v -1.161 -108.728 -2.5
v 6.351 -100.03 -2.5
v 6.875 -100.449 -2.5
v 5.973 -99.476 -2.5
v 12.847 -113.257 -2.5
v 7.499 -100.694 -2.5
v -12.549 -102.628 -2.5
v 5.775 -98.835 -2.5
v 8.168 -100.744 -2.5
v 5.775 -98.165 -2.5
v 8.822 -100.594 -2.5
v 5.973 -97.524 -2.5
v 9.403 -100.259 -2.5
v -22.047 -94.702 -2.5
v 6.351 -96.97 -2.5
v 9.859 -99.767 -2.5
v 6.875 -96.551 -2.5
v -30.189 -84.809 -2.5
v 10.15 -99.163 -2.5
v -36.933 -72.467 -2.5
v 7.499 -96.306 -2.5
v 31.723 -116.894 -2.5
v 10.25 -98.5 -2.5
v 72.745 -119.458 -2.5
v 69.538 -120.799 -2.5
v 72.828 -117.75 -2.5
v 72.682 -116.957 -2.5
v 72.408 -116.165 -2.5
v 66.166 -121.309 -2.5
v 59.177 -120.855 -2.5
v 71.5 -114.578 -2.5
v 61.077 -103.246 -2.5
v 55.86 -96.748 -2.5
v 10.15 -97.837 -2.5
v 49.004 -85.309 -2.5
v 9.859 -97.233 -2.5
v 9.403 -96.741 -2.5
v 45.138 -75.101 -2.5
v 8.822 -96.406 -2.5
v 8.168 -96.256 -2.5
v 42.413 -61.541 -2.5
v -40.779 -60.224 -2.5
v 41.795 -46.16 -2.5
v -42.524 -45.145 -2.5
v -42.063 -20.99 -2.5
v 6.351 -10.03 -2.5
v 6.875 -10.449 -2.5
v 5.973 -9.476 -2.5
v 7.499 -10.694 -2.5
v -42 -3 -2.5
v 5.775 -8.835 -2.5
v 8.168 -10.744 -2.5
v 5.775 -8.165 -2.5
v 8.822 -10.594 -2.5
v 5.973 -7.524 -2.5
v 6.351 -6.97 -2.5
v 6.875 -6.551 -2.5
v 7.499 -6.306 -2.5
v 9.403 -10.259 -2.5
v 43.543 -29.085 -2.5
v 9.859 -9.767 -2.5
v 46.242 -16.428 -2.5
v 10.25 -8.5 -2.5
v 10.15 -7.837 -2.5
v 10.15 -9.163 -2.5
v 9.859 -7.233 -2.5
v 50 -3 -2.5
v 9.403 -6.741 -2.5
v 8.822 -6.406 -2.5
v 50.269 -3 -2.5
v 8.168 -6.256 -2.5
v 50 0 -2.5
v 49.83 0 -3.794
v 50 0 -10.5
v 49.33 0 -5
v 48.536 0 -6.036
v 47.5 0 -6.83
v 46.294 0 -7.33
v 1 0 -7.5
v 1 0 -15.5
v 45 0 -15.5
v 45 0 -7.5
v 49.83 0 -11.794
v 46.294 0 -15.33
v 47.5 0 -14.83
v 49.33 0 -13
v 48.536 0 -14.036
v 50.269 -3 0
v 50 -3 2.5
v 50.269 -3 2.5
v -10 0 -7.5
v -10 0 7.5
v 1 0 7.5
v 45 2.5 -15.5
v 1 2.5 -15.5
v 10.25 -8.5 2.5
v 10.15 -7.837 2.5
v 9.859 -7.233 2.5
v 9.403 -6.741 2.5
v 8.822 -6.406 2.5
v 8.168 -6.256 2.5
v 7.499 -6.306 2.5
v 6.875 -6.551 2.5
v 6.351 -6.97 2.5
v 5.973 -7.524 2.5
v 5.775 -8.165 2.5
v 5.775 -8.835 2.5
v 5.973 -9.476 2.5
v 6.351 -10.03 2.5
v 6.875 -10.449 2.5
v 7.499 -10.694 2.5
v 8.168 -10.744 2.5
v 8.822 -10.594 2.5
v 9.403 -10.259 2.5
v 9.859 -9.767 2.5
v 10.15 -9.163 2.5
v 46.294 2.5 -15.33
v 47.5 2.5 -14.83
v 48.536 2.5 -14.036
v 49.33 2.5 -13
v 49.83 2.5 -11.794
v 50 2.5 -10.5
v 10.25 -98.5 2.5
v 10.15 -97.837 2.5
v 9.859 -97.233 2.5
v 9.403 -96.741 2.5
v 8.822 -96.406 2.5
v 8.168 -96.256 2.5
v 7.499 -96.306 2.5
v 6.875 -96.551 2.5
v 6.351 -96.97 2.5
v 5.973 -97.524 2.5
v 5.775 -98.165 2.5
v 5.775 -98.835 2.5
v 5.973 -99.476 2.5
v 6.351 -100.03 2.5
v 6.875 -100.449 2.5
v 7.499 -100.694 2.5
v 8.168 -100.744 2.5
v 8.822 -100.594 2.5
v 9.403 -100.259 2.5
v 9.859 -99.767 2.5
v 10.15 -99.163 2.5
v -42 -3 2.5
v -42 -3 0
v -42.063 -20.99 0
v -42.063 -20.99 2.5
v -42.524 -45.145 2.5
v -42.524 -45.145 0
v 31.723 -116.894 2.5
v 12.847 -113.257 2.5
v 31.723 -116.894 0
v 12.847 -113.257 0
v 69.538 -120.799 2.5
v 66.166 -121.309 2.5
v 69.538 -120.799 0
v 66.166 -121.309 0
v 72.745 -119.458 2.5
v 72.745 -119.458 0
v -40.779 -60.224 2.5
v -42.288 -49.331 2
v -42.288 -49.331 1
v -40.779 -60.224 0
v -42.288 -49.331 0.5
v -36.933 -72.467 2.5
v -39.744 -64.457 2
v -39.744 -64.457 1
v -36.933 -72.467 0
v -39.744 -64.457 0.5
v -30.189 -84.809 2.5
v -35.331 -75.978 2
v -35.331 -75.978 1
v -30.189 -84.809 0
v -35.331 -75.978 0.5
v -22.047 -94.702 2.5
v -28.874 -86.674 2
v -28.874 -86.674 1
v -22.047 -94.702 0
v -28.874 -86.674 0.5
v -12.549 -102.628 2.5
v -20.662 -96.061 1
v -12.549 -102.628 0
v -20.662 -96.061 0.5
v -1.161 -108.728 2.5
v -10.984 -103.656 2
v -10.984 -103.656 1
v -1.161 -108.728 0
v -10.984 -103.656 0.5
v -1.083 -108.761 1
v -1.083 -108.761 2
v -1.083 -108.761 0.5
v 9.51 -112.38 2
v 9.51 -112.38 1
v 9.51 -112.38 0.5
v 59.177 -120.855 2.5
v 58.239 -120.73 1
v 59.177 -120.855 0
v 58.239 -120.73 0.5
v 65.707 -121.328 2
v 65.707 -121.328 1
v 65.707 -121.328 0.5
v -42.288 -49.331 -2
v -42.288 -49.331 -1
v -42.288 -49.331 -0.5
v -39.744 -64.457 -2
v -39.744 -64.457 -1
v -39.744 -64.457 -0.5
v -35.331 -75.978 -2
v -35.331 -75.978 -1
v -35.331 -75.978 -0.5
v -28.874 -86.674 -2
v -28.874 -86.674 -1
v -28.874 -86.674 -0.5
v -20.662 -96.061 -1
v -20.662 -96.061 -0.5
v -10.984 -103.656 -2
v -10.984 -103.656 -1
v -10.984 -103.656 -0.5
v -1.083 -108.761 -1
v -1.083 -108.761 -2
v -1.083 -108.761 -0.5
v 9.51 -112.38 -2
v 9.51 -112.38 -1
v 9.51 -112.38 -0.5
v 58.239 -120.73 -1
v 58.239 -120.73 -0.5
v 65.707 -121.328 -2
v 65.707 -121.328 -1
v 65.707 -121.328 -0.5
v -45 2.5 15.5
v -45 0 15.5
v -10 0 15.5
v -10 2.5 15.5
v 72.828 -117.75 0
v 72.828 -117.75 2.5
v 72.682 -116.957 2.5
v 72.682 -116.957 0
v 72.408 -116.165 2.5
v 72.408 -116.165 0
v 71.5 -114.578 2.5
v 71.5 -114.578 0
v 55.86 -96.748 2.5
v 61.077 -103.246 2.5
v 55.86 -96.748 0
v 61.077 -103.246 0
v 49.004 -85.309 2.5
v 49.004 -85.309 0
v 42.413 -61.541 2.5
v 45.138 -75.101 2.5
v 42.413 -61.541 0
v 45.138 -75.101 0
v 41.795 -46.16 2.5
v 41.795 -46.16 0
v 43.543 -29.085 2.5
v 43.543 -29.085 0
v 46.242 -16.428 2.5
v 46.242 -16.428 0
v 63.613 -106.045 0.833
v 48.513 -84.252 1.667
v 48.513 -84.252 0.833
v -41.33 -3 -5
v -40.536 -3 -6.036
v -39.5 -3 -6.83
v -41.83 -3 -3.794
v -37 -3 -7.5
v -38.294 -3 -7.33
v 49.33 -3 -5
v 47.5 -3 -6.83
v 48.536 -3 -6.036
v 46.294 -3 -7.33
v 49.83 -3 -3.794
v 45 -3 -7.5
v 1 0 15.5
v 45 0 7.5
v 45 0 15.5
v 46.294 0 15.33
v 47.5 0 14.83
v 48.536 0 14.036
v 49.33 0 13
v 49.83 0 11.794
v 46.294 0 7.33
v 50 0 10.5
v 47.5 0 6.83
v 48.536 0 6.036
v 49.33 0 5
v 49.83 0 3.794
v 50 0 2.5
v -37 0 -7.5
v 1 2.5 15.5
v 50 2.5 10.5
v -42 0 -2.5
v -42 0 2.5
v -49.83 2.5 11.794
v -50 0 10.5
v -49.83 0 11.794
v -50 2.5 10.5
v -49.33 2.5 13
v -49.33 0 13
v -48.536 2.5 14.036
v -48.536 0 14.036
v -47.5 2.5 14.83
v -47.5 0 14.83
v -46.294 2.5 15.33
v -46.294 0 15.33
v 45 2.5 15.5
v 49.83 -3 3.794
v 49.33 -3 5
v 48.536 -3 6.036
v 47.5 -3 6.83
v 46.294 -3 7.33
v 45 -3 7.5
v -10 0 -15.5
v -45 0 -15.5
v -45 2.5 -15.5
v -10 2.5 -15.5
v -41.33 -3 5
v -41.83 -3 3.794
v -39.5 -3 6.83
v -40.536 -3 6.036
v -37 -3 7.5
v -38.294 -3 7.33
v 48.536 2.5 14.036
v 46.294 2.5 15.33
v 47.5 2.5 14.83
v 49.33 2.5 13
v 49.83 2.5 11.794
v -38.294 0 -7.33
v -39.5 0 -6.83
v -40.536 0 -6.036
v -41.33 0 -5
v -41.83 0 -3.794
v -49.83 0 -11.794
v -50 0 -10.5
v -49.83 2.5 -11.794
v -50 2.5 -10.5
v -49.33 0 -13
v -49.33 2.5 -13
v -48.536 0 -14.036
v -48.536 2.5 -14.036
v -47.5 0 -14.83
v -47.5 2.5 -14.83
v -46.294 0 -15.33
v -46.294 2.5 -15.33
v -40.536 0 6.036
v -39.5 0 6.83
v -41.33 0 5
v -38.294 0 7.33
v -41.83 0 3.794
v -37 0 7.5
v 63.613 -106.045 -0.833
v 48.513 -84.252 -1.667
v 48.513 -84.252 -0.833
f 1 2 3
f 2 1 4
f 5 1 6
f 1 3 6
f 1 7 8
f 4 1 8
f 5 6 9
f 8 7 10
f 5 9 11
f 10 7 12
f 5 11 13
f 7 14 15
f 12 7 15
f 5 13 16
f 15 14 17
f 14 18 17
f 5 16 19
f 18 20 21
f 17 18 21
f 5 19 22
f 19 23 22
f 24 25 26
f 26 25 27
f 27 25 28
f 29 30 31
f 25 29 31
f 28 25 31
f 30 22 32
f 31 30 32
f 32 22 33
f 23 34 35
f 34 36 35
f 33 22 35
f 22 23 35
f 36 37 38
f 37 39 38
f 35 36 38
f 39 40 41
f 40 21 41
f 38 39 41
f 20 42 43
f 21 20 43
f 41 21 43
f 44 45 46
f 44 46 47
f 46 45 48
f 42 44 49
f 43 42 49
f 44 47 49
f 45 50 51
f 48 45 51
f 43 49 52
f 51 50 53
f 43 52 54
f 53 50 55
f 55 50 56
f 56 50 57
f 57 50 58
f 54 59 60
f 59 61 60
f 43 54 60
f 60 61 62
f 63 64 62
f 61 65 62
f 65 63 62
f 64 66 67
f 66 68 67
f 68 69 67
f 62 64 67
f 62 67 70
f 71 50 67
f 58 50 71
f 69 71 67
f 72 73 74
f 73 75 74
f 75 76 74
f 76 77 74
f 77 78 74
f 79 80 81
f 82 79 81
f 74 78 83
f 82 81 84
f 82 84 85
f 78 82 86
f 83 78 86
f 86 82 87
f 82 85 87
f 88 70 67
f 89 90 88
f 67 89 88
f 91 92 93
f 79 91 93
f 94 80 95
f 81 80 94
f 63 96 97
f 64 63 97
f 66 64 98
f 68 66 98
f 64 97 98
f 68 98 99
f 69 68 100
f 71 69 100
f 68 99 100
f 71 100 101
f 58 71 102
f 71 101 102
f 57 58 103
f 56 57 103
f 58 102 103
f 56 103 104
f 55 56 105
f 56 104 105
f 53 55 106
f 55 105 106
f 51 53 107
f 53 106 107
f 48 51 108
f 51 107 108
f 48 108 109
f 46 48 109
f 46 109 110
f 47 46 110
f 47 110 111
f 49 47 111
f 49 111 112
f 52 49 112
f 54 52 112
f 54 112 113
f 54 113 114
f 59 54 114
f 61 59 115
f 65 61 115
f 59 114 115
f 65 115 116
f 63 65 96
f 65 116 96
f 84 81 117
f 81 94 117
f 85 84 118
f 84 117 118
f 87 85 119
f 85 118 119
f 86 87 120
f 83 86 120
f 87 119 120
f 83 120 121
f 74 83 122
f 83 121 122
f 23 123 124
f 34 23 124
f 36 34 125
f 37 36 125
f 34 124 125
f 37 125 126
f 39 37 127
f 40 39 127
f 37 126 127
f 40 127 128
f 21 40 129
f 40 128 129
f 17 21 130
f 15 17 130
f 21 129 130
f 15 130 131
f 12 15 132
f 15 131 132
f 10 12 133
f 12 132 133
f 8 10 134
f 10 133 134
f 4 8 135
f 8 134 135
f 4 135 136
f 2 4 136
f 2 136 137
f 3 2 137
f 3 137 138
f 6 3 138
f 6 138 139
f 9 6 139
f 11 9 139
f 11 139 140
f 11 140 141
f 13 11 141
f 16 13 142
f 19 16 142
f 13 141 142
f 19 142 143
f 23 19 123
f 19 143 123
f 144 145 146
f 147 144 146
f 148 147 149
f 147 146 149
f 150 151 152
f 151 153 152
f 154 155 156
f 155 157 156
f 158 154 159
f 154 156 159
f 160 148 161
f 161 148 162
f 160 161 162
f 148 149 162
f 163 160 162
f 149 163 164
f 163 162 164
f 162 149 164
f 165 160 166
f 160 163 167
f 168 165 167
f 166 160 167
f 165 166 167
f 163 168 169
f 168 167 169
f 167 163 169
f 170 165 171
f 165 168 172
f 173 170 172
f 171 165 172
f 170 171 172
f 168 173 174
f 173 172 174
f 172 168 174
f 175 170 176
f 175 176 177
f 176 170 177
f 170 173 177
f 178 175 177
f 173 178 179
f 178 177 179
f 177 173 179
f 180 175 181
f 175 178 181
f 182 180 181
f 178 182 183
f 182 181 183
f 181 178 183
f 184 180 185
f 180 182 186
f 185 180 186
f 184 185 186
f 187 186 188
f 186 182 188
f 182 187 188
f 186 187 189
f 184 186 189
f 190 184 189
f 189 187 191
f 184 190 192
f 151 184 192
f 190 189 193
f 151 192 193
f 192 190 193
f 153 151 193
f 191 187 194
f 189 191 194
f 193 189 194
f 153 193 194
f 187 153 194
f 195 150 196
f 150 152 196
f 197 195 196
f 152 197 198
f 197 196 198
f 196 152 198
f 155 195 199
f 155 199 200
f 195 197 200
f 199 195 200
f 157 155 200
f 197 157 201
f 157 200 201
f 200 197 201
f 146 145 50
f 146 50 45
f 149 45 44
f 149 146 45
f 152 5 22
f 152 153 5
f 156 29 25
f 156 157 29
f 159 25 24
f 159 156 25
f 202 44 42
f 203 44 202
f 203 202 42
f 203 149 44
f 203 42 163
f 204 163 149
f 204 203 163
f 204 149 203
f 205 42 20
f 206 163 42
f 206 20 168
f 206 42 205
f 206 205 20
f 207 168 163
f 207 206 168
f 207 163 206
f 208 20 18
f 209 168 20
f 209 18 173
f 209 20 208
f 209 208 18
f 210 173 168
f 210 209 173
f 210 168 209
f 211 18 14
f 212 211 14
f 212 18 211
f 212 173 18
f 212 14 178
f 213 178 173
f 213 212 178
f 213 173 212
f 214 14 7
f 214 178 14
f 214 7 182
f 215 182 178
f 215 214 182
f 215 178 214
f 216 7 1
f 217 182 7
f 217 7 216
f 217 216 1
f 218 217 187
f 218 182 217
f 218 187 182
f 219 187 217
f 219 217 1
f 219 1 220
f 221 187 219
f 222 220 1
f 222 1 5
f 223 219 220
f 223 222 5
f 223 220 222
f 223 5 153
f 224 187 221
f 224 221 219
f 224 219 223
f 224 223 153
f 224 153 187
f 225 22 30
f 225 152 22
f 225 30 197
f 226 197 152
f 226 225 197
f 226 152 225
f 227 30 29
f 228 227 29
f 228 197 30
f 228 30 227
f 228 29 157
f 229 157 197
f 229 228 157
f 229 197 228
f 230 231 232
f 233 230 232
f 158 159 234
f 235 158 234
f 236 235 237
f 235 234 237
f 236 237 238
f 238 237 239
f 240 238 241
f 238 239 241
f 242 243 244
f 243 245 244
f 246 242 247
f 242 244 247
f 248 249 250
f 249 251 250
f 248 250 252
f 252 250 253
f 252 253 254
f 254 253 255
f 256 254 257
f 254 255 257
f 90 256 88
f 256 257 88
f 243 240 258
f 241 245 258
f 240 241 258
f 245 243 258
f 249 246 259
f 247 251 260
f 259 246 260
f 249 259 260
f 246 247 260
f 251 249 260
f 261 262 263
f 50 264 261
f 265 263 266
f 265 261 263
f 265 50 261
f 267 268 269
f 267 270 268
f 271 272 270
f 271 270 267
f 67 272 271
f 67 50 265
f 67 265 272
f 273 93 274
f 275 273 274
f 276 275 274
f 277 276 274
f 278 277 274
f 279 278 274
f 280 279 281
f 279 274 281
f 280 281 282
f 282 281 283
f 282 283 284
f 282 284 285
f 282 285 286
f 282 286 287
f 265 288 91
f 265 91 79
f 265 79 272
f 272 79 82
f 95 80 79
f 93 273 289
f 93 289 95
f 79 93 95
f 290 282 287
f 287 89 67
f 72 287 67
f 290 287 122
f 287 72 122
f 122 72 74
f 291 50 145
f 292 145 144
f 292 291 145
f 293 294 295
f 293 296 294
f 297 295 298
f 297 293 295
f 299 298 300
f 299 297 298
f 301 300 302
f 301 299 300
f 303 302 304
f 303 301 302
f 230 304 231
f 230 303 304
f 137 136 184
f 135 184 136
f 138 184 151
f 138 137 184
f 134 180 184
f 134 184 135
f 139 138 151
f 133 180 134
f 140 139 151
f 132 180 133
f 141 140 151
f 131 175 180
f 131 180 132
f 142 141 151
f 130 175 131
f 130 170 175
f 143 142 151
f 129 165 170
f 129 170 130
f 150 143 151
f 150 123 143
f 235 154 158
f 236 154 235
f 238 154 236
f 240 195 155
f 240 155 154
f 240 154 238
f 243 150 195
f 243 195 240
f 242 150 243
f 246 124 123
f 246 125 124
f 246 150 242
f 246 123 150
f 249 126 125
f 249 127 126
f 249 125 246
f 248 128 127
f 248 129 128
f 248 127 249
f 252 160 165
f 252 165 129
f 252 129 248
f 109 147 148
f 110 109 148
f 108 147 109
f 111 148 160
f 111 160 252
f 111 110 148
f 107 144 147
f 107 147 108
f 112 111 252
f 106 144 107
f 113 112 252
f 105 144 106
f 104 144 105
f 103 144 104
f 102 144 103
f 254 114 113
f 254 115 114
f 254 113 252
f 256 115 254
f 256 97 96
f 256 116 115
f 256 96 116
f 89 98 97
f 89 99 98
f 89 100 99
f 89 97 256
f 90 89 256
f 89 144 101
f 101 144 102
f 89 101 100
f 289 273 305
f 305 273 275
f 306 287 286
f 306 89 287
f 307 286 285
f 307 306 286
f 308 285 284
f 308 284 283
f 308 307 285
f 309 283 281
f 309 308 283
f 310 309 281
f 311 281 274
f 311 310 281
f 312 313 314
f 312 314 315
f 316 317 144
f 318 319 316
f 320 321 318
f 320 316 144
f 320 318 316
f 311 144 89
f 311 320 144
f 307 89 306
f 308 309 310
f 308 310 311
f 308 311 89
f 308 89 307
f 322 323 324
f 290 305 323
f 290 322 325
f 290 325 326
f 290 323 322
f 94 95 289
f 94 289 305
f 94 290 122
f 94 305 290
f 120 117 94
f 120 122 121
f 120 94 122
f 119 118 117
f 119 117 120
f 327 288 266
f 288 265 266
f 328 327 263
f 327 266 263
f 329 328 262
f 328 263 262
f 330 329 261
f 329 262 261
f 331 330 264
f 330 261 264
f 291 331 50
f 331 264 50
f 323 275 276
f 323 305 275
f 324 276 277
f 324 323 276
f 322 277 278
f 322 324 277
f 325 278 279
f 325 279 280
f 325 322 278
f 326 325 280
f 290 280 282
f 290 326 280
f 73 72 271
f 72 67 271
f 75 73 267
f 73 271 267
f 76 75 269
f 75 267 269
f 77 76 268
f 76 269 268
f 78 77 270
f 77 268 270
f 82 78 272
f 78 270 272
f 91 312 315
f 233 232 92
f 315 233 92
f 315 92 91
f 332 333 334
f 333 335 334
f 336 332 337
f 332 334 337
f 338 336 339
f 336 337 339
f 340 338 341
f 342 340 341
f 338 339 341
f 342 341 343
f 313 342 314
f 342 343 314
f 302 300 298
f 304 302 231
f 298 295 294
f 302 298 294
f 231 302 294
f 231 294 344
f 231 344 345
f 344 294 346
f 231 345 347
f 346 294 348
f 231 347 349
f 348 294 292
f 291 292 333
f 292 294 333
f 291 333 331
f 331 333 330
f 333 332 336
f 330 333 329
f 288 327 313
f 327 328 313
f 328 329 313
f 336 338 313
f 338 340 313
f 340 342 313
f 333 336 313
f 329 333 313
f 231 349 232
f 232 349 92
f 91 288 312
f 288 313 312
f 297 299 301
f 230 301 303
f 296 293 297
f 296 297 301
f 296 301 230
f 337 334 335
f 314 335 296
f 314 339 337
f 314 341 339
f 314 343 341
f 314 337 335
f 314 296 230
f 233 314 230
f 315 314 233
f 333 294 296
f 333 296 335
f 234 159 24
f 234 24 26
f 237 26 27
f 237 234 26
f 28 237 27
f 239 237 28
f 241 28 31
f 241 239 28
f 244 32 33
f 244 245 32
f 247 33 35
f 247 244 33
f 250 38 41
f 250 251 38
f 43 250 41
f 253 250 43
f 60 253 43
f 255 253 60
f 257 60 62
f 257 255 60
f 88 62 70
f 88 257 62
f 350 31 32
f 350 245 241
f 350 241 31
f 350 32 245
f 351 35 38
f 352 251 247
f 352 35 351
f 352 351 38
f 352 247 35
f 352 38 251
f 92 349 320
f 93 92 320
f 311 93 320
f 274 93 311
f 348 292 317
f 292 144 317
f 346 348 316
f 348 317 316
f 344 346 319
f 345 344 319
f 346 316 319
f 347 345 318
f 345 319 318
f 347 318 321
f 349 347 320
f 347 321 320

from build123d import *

# Parameters (mm, degrees)
CROQUIS1_W              = 100
CROQUIS1_H              = 31
SALIENTE_EXTRUIR1_DEPTH = 2.5
CROQUIS2_W              = 92
CROQUIS2_H              = 15
SALIENTE_EXTRUIR2_DEPTH = 3
REDONDEO1_R             = 5
SALIENTE_EXTRUIR3_DEPTH = 2.5
CROQUIS4_R              = 2.25
CORTAR_EXTRUIR1_DEPTH   = 5
CROQUIS5_W              = 11
CROQUIS5_H              = 2.5
CORTAR_EXTRUIR2_DEPTH   = 32


with BuildPart() as part:
    # Croquis1 → Saliente-Extruir1 (new body)
    with BuildSketch(Plane(origin=(0, 0, 0), x_dir=(1, 0, 0), z_dir=(0, 1, 0))):
        Rectangle(CROQUIS1_W, CROQUIS1_H)
    extrude(amount=SALIENTE_EXTRUIR1_DEPTH)

    # Croquis2 → Saliente-Extruir2 (add)
    with BuildSketch(Plane.XZ):
        with Locations((4, 0)):
            Rectangle(CROQUIS2_W, CROQUIS2_H)
    extrude(amount=SALIENTE_EXTRUIR2_DEPTH)

    # Redondeo1
    redondeo1_edges = [part.edges().sort_by_distance(p)[0] for p in [
        (50, -1.5, -7.5),
        (50, -1.5, 7.5),
        (-42, -1.5, 7.5),
        (-42, -1.5, -7.5),
        (50, 1.25, 15.5),
        (-50, 1.25, 15.5),
        (-50, 1.25, -15.5),
        (50, 1.25, -15.5),
    ]]
    fillet(redondeo1_edges, radius=REDONDEO1_R)

    # Croquis3 → Saliente-Extruir3 (add, symmetric)
    with BuildSketch(Plane.XY):
        with BuildLine():
            Line((50.268673777, -3), (-42, -3))
            add(Edge.make_bspline(
                [(-42, -3), (-40.908513064, -23.29428707), (-48.776278563, -61.439241492), (-15.011612903, -108.496757753), (26.091280983, -116.271998862), (53.921744721, -120.172870924), (68.330972256, -122.076661229), (72.745319056, -119.457978538)],
                knots=[0, 0, 0, 0, 0.313172426, 0.560686791, 0.787562365, 0.924725026, 1, 1, 1, 1], degree=3))
            add(Edge.make_bspline(
                [(72.745319056, -119.457978538), (73.5272978, -115.295050348), (67.866383472, -111.564174063), (40.837413629, -79.656102563), (38.369873508, -37.789508287), (50.268673777, -3)],
                knots=[0, 0, 0, 0, 0.326988998, 0.554852248, 1, 1, 1, 1], degree=3))
        make_face()
    extrude(amount=SALIENTE_EXTRUIR3_DEPTH, both=True)

    # Croquis4 → Cortar-Extruir1 (cut)
    with BuildSketch(Plane.XY.offset(2.5)):
        with Locations((8, -8.5)):
            Circle(CROQUIS4_R)
        with Locations((8, -98.5)):
            Circle(CROQUIS4_R)
    extrude(amount=-CORTAR_EXTRUIR1_DEPTH, mode=Mode.SUBTRACT)

    # Croquis5 → Cortar-Extruir2 (cut, through all)
    with BuildSketch(Plane.XY.offset(15.5)):
        with Locations((-4.5, 1.25)):
            Rectangle(CROQUIS5_W, CROQUIS5_H)
    extrude(amount=-CORTAR_EXTRUIR2_DEPTH, mode=Mode.SUBTRACT)


solid = part.part
